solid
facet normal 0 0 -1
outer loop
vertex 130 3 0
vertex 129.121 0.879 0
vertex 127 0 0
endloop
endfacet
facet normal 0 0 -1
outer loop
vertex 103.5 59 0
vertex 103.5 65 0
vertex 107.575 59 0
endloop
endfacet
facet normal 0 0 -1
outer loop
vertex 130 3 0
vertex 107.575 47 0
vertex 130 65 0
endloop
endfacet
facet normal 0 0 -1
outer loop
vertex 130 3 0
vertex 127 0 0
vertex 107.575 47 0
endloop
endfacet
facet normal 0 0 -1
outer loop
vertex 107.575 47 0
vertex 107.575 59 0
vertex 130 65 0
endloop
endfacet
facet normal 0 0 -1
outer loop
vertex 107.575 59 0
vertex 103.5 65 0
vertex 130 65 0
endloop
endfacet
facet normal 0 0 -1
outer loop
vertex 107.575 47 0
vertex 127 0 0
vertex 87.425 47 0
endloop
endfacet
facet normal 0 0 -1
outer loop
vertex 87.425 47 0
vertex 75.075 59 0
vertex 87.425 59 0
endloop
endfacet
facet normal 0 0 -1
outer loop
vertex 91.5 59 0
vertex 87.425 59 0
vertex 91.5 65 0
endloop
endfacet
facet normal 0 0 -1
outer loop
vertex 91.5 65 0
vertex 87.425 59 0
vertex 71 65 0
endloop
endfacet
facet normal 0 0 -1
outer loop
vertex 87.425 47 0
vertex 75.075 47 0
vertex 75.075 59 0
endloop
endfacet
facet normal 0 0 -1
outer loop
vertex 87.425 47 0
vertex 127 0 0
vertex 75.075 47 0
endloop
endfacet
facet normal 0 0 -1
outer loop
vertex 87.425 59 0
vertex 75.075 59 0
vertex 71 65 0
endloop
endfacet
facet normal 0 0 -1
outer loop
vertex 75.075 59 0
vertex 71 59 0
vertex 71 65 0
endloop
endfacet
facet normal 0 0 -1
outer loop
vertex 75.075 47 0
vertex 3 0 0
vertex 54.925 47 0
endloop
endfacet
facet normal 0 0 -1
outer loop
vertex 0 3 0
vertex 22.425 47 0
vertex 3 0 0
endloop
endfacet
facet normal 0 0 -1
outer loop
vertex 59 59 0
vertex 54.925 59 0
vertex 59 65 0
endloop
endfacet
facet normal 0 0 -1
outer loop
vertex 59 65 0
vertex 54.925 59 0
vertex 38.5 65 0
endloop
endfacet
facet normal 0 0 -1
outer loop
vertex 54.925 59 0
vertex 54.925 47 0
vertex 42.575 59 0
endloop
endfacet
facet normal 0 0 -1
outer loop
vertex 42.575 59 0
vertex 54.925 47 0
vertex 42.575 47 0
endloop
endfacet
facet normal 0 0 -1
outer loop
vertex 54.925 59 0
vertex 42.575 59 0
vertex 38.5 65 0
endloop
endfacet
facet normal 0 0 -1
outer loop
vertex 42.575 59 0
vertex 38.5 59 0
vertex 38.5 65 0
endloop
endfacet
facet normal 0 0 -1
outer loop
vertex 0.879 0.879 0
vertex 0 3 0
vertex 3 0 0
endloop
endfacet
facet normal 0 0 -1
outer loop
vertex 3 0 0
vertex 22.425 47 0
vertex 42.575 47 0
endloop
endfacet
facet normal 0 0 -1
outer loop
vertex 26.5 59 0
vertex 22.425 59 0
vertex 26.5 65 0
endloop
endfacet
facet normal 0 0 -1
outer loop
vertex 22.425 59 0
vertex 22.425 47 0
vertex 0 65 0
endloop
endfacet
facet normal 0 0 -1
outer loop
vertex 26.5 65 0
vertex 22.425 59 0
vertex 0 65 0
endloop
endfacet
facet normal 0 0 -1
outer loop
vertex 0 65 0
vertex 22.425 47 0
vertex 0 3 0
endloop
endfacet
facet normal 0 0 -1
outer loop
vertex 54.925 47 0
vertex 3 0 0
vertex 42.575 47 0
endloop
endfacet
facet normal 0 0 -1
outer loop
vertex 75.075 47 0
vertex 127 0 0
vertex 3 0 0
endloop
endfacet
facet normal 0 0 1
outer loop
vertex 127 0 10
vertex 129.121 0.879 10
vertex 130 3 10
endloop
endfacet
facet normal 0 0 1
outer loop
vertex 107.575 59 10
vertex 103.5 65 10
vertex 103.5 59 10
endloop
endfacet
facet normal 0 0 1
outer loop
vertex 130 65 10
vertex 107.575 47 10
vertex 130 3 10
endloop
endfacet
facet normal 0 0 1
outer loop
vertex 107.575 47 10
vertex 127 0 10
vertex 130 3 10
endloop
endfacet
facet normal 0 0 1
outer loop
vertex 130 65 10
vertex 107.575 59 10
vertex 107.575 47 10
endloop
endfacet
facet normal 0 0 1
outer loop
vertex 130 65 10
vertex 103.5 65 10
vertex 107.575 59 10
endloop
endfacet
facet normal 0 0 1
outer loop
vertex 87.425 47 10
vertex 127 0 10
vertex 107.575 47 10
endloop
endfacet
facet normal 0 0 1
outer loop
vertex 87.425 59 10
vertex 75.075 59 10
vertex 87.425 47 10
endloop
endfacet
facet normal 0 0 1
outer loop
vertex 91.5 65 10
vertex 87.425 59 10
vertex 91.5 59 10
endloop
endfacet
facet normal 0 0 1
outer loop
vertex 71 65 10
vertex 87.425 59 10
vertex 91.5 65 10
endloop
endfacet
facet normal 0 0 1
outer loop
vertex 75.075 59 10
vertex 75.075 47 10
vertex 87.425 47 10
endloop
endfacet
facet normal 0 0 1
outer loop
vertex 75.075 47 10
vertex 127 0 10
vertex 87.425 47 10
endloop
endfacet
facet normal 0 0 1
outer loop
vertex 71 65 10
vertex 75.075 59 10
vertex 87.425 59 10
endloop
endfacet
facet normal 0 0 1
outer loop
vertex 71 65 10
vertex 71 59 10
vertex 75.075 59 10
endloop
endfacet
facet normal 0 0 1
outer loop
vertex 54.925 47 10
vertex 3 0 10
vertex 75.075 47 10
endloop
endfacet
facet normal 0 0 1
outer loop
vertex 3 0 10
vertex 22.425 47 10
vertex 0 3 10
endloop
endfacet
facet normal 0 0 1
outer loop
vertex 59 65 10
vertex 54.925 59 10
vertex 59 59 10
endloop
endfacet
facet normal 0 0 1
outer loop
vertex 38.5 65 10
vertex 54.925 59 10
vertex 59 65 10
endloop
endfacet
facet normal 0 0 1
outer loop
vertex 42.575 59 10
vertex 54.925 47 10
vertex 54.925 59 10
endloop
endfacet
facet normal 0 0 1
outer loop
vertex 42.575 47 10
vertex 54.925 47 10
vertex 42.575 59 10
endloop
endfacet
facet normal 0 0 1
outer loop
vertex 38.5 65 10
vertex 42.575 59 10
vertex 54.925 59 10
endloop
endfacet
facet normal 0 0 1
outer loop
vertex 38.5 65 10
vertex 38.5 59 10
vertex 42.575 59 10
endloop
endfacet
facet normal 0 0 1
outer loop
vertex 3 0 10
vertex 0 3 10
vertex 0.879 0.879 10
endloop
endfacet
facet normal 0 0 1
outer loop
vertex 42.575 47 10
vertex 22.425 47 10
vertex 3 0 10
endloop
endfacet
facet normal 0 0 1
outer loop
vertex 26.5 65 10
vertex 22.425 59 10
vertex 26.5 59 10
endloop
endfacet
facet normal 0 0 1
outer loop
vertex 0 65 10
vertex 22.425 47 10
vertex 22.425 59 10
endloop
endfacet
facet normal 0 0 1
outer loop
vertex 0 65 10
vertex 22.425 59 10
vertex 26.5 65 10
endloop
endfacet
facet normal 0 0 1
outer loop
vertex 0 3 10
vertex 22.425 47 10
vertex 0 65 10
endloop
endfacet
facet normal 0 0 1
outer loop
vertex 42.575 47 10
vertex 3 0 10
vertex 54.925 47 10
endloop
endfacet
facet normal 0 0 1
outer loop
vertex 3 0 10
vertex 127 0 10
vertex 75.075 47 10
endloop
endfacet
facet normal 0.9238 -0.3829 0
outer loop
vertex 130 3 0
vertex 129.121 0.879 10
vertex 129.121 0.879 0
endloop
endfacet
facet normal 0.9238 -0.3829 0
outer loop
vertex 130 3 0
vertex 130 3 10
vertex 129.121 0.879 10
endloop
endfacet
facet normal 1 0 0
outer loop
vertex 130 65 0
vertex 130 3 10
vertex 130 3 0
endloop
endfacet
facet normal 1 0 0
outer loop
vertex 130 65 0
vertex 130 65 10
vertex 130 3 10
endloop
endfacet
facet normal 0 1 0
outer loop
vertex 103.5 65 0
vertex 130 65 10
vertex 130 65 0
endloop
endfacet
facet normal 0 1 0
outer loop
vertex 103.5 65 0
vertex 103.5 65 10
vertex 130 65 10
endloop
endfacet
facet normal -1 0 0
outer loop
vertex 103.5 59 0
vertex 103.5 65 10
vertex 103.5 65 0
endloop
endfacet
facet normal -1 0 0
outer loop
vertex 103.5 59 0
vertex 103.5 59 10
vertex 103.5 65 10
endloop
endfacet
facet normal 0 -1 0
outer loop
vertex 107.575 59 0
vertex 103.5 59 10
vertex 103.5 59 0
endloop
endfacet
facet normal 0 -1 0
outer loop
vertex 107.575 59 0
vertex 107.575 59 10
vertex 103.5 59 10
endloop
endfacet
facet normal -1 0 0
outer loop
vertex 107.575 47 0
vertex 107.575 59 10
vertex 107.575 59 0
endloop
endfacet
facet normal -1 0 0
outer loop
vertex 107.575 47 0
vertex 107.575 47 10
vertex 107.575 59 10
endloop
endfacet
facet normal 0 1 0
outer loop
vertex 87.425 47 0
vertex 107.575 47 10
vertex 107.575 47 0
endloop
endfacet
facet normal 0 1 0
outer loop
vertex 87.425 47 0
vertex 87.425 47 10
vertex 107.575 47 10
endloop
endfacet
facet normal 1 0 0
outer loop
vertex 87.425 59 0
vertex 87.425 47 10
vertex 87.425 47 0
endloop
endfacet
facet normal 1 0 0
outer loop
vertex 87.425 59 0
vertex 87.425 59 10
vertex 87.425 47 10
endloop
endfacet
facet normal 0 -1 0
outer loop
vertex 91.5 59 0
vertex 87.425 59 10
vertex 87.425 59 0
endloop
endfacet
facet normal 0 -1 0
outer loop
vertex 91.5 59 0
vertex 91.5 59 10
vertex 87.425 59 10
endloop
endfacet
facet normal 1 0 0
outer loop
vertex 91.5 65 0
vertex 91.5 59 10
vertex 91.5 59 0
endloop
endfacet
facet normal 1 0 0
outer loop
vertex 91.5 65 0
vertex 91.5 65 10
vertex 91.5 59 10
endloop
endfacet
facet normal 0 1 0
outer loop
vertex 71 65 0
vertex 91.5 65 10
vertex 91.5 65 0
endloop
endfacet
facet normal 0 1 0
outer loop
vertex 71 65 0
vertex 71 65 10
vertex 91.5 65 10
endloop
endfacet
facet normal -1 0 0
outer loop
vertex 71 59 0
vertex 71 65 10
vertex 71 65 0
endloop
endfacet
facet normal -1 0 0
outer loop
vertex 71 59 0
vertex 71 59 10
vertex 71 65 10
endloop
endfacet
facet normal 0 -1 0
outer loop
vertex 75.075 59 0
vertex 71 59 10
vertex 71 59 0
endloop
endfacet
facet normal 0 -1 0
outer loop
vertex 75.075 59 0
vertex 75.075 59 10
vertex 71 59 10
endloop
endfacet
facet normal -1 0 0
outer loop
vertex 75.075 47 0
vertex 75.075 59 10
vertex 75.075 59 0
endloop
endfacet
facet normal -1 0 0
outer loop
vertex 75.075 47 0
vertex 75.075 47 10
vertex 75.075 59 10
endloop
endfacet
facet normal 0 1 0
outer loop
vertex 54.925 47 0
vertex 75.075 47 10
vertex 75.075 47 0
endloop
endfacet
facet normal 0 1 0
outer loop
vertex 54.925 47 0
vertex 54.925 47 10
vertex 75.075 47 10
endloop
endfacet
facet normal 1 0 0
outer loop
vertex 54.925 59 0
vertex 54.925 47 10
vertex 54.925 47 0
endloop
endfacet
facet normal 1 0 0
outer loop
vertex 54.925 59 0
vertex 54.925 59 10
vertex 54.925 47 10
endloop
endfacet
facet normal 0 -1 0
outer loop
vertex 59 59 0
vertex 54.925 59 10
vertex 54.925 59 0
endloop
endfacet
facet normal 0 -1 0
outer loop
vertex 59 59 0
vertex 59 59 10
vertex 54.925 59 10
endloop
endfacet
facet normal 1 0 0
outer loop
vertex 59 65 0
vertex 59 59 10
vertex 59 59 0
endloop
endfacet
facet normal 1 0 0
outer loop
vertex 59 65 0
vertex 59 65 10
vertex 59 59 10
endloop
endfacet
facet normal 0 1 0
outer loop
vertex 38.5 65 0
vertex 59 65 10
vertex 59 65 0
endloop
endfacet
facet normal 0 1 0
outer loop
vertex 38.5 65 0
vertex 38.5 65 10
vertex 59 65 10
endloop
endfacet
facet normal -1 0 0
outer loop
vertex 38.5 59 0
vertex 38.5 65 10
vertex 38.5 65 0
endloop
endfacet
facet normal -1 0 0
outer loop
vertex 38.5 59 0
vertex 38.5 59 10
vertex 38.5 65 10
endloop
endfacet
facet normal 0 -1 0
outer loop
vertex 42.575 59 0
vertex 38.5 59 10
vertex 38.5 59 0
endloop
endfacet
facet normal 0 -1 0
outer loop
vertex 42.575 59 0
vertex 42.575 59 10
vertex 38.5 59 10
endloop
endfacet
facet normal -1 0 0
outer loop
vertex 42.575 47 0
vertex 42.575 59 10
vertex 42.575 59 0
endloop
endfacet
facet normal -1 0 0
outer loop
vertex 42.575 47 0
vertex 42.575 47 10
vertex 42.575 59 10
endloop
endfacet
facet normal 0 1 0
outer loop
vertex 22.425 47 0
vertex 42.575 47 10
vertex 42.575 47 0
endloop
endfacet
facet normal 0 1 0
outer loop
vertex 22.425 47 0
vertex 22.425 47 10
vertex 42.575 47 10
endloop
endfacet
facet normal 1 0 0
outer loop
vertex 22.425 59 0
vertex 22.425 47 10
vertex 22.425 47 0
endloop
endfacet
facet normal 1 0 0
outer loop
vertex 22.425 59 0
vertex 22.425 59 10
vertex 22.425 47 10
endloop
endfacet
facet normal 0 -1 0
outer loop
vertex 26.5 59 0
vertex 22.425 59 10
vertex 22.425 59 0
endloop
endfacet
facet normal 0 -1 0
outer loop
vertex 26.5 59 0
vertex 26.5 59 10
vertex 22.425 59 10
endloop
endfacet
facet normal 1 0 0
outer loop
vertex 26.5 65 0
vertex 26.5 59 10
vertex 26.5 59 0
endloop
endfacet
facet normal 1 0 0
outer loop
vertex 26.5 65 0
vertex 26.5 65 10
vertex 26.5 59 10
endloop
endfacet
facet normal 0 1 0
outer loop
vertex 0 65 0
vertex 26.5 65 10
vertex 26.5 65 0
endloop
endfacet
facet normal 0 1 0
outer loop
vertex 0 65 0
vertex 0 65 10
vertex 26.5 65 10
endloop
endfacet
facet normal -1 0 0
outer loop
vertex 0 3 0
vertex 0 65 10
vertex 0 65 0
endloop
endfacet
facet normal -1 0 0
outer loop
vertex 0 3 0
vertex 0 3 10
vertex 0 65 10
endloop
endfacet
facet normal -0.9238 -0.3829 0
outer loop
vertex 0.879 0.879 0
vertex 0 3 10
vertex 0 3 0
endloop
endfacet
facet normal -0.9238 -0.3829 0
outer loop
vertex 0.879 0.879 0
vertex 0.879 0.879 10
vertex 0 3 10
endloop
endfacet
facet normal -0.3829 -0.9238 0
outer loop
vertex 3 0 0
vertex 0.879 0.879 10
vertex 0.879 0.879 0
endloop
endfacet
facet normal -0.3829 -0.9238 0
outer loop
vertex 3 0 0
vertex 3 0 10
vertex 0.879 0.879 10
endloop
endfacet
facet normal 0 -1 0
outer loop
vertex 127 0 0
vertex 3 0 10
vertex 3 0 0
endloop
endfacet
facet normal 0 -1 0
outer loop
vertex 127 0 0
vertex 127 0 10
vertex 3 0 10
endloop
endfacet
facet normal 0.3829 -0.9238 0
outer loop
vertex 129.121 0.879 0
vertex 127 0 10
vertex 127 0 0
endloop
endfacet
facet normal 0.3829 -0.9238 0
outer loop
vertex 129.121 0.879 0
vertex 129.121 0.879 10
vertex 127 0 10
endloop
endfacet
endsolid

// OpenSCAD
$fn = 32;

// ----------------------------------------------------------------------
// Window plate: 130 x 65 mm, 3 open windows
// ----------------------------------------------------------------------

// --- parameters (mm) ---
profile_height = 10;      // extrusion height
profile_points = 32;      // points of the closed outline

profile = [[0, 3], [0.879, 0.879], [3, 0], [127, 0], [129.121, 0.879], [130, 3], [130, 65], [103.5, 65], [103.5, 59], [107.575, 59], [107.575, 47], [87.425, 47], [87.425, 59], [91.5, 59], [91.5, 65], [71, 65], [71, 59], [75.075, 59], [75.075, 47], [54.925, 47], [54.925, 59], [59, 59], [59, 65], [38.5, 65], [38.5, 59], [42.575, 59], [42.575, 47], [22.425, 47], [22.425, 59], [26.5, 59], [26.5, 65], [0, 65]];  // single closed polygon, 32 points, counter clockwise

// --- the one profile operation ---
linear_extrude(height = profile_height) polygon(points = profile);
